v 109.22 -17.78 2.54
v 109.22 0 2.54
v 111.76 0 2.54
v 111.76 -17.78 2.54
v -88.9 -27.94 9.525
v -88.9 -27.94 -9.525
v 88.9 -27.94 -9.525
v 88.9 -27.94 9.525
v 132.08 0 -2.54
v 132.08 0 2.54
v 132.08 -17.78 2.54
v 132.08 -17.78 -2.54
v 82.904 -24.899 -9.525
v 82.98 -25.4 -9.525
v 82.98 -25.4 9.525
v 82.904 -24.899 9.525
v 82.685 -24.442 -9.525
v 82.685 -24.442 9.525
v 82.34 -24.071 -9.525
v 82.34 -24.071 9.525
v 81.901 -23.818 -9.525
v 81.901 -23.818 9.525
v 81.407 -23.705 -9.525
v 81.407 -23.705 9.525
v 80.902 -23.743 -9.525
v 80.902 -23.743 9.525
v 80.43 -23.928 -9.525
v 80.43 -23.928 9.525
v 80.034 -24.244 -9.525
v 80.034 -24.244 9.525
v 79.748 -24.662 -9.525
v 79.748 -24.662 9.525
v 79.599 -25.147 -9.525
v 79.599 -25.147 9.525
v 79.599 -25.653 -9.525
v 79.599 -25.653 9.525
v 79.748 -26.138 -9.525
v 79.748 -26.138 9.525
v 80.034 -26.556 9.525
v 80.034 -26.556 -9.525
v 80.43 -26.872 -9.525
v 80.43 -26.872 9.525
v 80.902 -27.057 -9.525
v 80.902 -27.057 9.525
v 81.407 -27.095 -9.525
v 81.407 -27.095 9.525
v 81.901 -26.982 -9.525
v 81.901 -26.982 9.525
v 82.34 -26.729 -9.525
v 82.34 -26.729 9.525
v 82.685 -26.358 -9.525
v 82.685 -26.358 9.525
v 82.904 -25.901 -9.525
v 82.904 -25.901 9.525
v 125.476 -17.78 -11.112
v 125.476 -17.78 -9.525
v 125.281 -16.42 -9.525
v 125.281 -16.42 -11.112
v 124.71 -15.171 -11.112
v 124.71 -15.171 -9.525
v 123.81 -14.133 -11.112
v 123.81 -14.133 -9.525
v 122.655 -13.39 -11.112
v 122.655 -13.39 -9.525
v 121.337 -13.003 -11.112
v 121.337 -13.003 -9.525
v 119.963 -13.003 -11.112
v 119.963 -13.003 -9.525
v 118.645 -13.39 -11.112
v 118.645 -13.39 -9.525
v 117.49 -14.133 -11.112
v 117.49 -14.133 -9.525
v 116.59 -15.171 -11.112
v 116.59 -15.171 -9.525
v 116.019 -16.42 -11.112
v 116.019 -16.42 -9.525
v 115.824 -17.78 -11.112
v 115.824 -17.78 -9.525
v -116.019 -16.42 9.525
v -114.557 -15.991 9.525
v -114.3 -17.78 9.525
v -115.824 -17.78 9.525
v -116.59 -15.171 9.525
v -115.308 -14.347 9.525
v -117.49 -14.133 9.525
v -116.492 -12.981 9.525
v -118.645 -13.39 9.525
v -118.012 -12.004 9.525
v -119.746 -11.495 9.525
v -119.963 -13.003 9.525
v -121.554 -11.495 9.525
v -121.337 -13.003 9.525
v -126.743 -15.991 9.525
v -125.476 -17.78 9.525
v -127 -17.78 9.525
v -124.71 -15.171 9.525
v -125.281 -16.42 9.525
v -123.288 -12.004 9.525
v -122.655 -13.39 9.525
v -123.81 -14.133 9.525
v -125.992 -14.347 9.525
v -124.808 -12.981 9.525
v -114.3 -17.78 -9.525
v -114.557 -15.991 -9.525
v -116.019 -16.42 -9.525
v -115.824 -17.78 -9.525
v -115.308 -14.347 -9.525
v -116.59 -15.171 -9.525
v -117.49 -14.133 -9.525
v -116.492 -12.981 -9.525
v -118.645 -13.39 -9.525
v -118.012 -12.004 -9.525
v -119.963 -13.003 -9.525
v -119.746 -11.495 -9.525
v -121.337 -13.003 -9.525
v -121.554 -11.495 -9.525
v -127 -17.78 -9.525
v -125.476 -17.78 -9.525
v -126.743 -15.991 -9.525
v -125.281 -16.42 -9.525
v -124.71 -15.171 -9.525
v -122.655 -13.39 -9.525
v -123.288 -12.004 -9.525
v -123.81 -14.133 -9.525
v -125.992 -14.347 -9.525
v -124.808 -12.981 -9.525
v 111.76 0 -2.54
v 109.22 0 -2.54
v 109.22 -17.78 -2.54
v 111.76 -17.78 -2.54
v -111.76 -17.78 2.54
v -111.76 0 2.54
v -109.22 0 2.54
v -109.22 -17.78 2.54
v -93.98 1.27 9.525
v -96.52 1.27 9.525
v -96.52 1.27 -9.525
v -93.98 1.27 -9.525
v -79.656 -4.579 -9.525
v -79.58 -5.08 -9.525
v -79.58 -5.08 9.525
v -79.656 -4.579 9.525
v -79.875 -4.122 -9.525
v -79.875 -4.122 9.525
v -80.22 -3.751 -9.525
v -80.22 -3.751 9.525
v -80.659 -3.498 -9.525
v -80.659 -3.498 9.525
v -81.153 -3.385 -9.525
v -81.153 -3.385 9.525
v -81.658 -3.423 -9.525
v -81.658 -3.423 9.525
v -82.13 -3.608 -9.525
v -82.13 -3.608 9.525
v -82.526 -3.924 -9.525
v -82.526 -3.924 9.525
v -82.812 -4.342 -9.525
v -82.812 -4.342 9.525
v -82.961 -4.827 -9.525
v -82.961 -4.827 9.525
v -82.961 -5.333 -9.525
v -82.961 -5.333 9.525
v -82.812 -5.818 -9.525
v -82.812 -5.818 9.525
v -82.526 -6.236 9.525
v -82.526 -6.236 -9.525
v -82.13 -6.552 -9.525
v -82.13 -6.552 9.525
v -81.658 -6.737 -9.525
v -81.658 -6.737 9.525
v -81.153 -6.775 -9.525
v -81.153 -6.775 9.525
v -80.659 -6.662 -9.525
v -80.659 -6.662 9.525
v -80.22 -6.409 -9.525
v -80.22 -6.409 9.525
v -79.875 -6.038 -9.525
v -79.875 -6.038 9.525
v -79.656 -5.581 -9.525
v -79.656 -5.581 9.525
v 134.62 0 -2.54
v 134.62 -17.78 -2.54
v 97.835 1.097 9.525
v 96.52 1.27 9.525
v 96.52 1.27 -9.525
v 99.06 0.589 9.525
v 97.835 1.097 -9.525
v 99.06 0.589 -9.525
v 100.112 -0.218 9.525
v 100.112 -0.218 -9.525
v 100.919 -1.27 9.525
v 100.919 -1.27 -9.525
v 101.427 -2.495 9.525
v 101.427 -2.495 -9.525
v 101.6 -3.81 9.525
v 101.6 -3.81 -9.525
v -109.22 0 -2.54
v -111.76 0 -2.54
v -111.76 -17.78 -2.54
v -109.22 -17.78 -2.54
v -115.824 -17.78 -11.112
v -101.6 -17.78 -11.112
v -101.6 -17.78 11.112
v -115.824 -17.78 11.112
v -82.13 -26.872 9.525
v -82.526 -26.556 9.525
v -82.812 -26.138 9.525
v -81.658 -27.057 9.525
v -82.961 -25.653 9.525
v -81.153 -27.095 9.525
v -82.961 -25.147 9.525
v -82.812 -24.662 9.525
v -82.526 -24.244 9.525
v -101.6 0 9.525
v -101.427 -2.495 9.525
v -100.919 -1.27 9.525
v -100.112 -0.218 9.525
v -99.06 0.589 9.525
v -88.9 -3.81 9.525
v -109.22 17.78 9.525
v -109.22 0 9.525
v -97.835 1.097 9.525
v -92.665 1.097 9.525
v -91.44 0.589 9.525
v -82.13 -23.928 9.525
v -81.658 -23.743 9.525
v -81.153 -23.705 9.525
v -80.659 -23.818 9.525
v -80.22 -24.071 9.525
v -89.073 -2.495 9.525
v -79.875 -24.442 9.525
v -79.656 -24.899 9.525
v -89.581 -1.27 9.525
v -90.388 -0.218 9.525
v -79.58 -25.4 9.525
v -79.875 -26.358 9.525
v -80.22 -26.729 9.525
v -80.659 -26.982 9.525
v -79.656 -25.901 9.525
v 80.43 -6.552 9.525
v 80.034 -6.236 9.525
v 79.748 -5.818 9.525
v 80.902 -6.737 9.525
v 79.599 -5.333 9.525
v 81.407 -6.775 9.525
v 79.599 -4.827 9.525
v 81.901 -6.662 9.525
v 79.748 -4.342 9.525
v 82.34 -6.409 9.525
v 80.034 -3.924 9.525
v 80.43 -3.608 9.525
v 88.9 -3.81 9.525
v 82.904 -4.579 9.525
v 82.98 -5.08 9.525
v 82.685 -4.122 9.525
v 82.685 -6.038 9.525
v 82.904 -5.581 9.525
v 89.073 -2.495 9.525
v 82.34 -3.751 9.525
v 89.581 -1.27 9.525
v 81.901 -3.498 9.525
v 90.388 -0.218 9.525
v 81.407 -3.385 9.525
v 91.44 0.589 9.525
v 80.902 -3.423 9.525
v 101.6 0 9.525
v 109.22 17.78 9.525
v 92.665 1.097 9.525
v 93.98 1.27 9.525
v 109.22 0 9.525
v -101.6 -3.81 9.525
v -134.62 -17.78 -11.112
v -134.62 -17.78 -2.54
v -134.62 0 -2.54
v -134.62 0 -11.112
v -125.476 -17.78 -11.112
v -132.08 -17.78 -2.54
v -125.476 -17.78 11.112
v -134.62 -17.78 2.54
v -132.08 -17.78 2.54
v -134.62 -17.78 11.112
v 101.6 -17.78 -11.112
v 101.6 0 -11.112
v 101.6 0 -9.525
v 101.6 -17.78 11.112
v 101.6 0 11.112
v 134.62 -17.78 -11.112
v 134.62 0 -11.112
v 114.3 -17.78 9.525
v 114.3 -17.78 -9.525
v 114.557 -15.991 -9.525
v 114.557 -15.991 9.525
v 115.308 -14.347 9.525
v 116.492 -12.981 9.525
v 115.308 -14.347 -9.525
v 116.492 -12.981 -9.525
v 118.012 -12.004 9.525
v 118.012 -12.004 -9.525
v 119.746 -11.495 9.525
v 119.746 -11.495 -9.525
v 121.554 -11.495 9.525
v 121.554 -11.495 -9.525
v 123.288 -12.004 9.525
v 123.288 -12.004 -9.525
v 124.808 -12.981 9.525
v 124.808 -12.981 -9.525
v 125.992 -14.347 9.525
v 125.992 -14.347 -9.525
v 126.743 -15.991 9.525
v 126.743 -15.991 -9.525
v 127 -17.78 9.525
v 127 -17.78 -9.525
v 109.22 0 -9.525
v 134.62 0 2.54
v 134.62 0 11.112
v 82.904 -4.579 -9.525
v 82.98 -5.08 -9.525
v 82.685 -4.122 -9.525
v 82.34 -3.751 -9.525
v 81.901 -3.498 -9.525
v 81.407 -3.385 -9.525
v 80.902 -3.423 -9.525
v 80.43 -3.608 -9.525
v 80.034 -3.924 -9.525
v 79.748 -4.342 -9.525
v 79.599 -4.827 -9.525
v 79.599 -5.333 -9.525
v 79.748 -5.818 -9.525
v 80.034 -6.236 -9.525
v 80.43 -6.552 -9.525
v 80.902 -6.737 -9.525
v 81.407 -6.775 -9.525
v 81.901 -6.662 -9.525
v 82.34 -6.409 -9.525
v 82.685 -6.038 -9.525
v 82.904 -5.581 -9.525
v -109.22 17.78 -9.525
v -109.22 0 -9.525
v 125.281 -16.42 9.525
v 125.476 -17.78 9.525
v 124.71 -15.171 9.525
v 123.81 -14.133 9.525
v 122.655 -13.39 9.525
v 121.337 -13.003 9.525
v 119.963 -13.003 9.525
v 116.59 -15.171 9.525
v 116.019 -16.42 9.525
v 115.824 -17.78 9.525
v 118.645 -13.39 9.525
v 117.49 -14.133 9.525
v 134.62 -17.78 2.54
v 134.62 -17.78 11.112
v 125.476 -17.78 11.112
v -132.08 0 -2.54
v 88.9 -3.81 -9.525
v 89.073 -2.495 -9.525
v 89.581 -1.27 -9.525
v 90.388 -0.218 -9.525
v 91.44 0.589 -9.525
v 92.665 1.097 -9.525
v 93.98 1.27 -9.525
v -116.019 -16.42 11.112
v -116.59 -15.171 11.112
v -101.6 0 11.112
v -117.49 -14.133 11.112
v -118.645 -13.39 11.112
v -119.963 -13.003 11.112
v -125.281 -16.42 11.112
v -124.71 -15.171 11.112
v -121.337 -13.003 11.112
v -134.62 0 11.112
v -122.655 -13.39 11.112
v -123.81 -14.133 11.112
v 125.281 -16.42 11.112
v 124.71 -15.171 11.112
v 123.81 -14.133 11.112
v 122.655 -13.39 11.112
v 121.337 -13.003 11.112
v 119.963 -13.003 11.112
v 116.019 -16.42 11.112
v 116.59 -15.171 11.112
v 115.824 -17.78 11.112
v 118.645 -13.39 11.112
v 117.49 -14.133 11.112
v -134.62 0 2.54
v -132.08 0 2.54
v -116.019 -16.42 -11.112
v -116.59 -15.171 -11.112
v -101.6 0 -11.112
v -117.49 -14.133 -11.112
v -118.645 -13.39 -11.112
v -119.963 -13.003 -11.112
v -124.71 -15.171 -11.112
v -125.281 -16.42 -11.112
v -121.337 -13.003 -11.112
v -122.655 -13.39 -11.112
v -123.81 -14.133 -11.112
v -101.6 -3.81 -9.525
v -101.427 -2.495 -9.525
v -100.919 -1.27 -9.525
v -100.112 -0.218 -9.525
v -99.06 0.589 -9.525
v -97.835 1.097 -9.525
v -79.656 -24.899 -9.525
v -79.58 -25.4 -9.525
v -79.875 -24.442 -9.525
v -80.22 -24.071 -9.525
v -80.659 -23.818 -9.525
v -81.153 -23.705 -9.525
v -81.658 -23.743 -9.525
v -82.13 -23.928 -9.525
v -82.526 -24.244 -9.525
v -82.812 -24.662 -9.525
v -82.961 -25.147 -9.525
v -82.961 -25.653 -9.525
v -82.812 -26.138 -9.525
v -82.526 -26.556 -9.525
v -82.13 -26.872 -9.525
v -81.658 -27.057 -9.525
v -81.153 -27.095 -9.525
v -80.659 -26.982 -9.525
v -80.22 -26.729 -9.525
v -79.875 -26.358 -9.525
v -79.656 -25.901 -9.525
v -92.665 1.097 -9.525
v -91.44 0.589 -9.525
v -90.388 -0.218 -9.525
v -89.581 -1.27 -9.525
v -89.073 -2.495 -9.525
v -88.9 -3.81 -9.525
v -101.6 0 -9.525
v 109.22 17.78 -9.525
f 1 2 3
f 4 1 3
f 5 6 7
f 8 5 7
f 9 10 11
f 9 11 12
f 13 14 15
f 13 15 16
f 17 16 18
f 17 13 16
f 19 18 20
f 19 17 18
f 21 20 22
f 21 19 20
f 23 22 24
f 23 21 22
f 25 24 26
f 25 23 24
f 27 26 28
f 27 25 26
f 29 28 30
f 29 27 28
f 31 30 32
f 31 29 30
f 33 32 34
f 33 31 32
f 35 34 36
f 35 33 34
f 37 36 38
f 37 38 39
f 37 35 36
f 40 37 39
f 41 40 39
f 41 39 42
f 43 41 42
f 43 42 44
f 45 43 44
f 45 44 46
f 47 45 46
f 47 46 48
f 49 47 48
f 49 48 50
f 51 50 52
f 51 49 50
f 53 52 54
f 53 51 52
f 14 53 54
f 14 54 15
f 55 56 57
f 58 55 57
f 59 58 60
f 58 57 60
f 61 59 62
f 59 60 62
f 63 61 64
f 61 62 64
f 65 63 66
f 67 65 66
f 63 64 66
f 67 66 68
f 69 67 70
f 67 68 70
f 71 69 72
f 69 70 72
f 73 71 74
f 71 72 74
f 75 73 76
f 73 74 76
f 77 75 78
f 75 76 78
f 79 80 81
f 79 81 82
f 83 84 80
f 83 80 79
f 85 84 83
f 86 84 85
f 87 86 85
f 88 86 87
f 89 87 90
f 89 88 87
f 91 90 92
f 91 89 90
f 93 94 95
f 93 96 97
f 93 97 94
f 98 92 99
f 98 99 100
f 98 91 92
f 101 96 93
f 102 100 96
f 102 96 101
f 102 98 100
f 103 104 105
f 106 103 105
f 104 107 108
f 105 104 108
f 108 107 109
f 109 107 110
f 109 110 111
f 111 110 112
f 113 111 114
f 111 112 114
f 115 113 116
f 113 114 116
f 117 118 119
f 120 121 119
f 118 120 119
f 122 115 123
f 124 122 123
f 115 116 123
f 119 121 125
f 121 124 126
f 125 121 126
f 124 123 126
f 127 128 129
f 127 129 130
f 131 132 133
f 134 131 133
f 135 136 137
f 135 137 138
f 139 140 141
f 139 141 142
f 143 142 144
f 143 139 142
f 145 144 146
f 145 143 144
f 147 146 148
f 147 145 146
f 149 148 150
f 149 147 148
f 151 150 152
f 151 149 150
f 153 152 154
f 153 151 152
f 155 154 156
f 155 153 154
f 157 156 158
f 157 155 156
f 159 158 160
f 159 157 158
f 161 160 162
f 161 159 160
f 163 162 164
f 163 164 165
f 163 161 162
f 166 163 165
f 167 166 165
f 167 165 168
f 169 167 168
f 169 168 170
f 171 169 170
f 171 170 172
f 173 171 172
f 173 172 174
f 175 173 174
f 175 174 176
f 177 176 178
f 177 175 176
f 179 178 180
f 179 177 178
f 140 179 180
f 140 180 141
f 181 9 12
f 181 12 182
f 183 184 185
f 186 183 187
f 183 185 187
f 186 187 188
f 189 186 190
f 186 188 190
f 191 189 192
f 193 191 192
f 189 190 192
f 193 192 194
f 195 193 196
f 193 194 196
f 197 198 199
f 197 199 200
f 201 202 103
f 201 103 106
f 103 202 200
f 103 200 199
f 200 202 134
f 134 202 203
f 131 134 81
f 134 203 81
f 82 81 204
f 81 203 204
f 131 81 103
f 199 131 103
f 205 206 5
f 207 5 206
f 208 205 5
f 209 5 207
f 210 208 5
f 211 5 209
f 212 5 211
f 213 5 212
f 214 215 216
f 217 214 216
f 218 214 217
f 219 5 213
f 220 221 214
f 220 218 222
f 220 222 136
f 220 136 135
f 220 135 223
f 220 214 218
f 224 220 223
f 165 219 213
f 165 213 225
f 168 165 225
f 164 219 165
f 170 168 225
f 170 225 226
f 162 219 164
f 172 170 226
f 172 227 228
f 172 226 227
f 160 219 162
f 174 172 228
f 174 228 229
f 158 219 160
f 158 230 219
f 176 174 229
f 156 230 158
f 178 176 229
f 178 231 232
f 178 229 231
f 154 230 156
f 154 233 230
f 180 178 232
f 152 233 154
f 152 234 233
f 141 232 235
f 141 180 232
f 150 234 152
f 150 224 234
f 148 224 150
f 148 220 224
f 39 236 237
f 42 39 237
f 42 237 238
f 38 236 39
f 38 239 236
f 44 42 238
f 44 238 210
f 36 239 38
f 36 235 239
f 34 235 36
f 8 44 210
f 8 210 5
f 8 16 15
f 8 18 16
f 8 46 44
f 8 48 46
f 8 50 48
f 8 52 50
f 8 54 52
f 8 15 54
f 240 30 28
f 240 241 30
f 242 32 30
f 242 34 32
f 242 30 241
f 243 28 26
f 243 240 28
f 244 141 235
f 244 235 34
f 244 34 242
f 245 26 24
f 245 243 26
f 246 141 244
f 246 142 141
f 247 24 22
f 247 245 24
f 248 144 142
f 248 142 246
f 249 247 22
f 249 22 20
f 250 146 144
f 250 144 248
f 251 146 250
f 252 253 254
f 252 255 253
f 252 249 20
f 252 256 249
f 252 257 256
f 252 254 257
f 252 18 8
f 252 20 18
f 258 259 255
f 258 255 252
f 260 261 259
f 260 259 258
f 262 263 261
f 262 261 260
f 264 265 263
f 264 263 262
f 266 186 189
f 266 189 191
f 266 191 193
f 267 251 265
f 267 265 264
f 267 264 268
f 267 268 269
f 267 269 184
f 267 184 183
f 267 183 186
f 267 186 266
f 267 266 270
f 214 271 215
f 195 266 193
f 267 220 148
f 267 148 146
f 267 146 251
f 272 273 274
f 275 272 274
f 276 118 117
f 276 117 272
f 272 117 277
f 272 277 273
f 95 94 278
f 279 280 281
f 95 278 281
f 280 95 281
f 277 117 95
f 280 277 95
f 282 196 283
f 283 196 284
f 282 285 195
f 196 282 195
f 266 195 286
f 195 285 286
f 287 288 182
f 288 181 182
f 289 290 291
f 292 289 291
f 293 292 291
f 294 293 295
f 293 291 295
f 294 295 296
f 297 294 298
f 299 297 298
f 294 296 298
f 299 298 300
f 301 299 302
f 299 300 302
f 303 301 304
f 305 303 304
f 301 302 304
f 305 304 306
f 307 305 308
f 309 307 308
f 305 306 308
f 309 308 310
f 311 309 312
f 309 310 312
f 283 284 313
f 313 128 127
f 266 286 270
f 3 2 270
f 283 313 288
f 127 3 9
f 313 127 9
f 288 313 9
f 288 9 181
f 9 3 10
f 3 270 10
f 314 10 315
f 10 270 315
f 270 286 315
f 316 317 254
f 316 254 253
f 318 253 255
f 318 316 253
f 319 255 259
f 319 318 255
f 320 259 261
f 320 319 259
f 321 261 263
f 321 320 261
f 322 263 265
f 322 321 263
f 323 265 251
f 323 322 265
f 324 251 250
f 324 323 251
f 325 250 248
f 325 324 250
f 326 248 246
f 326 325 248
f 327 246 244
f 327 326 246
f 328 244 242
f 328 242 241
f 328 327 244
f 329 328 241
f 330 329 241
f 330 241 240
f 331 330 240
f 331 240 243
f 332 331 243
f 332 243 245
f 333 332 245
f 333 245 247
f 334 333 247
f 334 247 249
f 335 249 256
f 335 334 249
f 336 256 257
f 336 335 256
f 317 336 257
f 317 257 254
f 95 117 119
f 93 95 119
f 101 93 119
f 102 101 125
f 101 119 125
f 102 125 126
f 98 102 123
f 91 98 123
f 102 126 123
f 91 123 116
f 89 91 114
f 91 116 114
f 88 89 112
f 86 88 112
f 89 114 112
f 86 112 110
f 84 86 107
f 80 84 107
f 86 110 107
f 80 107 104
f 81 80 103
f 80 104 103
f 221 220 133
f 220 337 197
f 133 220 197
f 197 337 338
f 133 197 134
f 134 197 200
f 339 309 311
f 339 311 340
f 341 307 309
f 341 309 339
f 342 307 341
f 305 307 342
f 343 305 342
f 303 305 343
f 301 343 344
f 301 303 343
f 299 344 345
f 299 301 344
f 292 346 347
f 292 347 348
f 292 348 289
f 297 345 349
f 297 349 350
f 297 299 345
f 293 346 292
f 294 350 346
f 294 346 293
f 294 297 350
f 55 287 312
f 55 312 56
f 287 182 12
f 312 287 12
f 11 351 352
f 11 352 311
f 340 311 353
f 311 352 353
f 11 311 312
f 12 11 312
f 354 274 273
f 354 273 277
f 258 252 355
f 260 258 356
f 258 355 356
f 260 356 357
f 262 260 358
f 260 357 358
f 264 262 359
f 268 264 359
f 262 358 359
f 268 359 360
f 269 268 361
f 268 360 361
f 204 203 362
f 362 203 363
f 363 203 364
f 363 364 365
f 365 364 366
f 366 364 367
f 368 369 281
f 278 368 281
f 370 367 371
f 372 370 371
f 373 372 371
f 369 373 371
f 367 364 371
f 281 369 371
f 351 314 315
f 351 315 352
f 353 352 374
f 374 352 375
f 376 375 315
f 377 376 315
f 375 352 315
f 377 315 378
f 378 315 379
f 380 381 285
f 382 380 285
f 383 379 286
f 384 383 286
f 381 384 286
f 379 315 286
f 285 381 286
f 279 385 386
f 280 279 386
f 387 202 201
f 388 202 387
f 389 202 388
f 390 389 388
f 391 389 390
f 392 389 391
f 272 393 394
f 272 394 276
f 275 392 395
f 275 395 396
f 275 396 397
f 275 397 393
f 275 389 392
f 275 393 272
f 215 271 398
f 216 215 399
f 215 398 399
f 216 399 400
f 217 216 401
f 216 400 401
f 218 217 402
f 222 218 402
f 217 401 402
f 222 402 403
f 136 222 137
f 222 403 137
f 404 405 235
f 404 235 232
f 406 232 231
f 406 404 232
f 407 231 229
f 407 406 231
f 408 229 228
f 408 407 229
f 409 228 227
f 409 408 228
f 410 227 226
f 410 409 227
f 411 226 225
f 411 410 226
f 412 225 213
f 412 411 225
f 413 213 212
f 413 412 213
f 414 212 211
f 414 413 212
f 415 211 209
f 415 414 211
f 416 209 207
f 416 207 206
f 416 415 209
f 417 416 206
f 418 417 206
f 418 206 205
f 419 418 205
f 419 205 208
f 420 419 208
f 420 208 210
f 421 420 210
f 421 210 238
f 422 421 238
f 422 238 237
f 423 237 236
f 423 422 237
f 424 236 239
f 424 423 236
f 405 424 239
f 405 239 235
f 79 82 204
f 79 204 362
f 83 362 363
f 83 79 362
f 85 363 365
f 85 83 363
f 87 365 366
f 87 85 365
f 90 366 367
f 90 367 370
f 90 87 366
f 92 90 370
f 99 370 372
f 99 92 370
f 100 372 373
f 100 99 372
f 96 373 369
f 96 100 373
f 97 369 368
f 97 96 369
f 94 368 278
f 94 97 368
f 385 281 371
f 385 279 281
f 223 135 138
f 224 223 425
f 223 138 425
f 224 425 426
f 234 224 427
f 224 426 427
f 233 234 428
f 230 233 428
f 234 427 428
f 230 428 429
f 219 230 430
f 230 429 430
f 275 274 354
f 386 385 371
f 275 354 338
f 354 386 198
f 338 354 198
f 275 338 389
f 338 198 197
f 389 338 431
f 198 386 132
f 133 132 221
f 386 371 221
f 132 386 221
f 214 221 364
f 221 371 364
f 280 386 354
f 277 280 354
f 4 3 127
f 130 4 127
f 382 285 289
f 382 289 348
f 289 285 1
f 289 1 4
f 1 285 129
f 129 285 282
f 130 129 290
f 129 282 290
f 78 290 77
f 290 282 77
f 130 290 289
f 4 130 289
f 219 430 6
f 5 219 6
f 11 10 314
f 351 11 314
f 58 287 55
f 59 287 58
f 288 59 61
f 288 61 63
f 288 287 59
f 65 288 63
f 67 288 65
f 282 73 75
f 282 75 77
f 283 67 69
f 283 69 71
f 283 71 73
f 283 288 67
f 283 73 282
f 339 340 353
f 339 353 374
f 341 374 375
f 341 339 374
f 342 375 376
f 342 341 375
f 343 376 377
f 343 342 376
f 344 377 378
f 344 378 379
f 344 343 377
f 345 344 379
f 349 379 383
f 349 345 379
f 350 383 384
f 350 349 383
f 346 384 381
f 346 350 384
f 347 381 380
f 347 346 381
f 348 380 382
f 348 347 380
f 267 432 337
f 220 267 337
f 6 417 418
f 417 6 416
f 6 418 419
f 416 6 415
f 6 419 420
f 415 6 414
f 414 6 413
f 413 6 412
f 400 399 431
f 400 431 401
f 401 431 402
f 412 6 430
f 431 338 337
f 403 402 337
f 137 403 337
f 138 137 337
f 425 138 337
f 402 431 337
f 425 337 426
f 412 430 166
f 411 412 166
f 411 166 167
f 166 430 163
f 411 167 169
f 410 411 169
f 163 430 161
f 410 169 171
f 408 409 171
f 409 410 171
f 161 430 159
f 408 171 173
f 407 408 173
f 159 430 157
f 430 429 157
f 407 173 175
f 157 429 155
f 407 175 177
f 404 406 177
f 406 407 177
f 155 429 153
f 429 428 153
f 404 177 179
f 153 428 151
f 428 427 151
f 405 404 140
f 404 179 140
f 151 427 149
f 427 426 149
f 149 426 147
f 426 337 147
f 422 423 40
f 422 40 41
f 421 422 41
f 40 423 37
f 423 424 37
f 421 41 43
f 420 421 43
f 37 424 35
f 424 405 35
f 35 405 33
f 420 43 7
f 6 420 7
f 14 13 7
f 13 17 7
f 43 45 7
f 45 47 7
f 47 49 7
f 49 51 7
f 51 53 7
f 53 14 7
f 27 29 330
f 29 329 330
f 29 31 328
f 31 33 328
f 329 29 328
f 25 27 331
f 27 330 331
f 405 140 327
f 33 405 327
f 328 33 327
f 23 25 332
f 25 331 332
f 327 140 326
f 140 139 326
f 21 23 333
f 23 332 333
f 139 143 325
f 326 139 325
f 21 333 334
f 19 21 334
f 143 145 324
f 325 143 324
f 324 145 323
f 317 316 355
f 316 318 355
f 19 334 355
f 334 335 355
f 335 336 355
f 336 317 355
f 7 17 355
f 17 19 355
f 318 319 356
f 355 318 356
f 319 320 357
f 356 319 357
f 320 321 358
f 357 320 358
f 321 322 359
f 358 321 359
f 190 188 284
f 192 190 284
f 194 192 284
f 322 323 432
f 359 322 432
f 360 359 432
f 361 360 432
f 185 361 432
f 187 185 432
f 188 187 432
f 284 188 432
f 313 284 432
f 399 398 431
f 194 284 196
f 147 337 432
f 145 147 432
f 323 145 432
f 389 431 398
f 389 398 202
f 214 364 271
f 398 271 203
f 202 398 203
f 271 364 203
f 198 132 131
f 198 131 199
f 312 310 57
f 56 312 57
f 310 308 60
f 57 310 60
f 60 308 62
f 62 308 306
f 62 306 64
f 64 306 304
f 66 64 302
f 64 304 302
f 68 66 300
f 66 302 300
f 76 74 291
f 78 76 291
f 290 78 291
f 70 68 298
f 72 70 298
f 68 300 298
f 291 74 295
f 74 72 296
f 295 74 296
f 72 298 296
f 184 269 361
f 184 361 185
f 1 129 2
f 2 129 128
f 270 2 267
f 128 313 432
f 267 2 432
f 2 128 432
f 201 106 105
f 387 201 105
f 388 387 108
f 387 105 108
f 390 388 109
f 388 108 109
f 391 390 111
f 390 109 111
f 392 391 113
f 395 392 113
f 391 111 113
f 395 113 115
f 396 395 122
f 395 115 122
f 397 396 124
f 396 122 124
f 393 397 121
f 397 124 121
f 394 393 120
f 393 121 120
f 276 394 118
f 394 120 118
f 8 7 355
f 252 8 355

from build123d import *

# Parameters (mm, degrees)
BOSS_EXTRUDE1_DEPTH      = 9.525
BOSS_EXTRUDE1_DEPTH_BACK = 9.525
SKETCH1_R                = 1.7
SKETCH2_W                = 2.54
SKETCH2_H                = 5.08
CUT_EXTRUDE1_DEPTH       = 27.686
BOSS_EXTRUDE2_DEPTH      = 1.5875


with BuildPart() as part:
    # Sketch1 → Boss-Extrude1 (new, two sides: drawn at the far end of the back side and taken through both)
    with BuildSketch(Plane.XY.offset(-BOSS_EXTRUDE1_DEPTH_BACK)):
        with BuildLine():
            Line((-109.22, 0), (-134.62, 0))
            Line((-134.62, 0), (-134.62, -17.78))
            Line((-134.62, -17.78), (-127, -17.78))
            ThreePointArc((-127, -17.78), (-120.65, -11.43), (-114.3, -17.78))
            Line((-114.3, -17.78), (-109.22, -17.78))
            Line((-109.22, -17.78), (-101.6, -17.78))
            Line((-101.6, -17.78), (-101.6, -3.81))
            ThreePointArc((-101.6, -3.81), (-100.112102448, -0.217897552), (-96.52, 1.27))
            Line((-96.52, 1.27), (-93.98, 1.27))
            ThreePointArc((-93.98, 1.27), (-90.387897552, -0.217897552), (-88.9, -3.81))
            Line((-88.9, -3.81), (-88.9, -17.78))
            Line((-88.9, -17.78), (-88.9, -27.94))
            Line((-88.9, -27.94), (88.9, -27.94))
            Line((88.9, -27.94), (88.9, -17.78))
            Line((88.9, -17.78), (88.9, -3.81))
            ThreePointArc((88.9, -3.81), (90.387897552, -0.217897552), (93.98, 1.27))
            Line((93.98, 1.27), (96.52, 1.27))
            ThreePointArc((96.52, 1.27), (100.112102448, -0.217897552), (101.6, -3.81))
            Line((101.6, -3.81), (101.6, -17.78))
            Line((101.6, -17.78), (109.22, -17.78))
            Line((109.22, -17.78), (114.3, -17.78))
            ThreePointArc((114.3, -17.78), (120.65, -11.43), (127, -17.78))
            Line((127, -17.78), (134.62, -17.78))
            Line((134.62, -17.78), (134.62, 0))
            Line((134.62, 0), (109.22, 0))
            Line((109.22, 0), (109.22, 17.78))
            Line((109.22, 17.78), (-109.22, 17.78))
            Line((-109.22, 17.78), (-109.22, 0))
        make_face()
        with Locations((-81.28, -25.4)):
            Circle(SKETCH1_R, mode=Mode.SUBTRACT)
        with Locations((-81.28, -5.08)):
            Circle(SKETCH1_R, mode=Mode.SUBTRACT)
        with Locations((81.28, -25.4)):
            Circle(SKETCH1_R, mode=Mode.SUBTRACT)
        with Locations((81.28, -5.08)):
            Circle(SKETCH1_R, mode=Mode.SUBTRACT)
    extrude(amount=BOSS_EXTRUDE1_DEPTH + BOSS_EXTRUDE1_DEPTH_BACK)

    # Sketch2 → Cut-Extrude1 (cut)
    with BuildSketch(Plane(origin=(0, 0, 0), x_dir=(1, 0, 0), z_dir=(0, 1, 0))):
        with Locations((-110.49, 0)):
            Rectangle(SKETCH2_W, SKETCH2_H)
        with Locations((-133.35, 0)):
            Rectangle(SKETCH2_W, SKETCH2_H)
        with Locations((133.35, 0)):
            Rectangle(SKETCH2_W, SKETCH2_H)
        with Locations((110.49, 0)):
            Rectangle(SKETCH2_W, SKETCH2_H)
    extrude(amount=-CUT_EXTRUDE1_DEPTH, mode=Mode.SUBTRACT)

    # Sketch3 → Boss-Extrude2 (add)
    with BuildSketch(Plane.XY.offset(9.525)):
        with BuildLine():
            Line((-134.62, 0), (-101.6, 0))
            Line((-101.6, 0), (-101.6, -17.78))
            Line((-101.6, -17.78), (-115.824, -17.78))
            ThreePointArc((-115.824, -17.78), (-120.65, -12.954), (-125.476, -17.78))
            Line((-125.476, -17.78), (-134.62, -17.78))
            Line((-134.62, -17.78), (-134.62, 0))
        make_face()
        with BuildLine():
            Line((134.62, -17.78), (125.476, -17.78))
            ThreePointArc((125.476, -17.78), (120.65, -12.954), (115.824, -17.78))
            Line((115.824, -17.78), (101.6, -17.78))
            Line((101.6, -17.78), (101.6, 0))
            Line((101.6, 0), (134.62, 0))
            Line((134.62, 0), (134.62, -17.78))
        make_face()
    boss_extrude2 = extrude(amount=BOSS_EXTRUDE2_DEPTH)

    # Mirror1: Boss-Extrude2 across plane
    add(boss_extrude2.mirror(Plane.XY))


solid = part.part
